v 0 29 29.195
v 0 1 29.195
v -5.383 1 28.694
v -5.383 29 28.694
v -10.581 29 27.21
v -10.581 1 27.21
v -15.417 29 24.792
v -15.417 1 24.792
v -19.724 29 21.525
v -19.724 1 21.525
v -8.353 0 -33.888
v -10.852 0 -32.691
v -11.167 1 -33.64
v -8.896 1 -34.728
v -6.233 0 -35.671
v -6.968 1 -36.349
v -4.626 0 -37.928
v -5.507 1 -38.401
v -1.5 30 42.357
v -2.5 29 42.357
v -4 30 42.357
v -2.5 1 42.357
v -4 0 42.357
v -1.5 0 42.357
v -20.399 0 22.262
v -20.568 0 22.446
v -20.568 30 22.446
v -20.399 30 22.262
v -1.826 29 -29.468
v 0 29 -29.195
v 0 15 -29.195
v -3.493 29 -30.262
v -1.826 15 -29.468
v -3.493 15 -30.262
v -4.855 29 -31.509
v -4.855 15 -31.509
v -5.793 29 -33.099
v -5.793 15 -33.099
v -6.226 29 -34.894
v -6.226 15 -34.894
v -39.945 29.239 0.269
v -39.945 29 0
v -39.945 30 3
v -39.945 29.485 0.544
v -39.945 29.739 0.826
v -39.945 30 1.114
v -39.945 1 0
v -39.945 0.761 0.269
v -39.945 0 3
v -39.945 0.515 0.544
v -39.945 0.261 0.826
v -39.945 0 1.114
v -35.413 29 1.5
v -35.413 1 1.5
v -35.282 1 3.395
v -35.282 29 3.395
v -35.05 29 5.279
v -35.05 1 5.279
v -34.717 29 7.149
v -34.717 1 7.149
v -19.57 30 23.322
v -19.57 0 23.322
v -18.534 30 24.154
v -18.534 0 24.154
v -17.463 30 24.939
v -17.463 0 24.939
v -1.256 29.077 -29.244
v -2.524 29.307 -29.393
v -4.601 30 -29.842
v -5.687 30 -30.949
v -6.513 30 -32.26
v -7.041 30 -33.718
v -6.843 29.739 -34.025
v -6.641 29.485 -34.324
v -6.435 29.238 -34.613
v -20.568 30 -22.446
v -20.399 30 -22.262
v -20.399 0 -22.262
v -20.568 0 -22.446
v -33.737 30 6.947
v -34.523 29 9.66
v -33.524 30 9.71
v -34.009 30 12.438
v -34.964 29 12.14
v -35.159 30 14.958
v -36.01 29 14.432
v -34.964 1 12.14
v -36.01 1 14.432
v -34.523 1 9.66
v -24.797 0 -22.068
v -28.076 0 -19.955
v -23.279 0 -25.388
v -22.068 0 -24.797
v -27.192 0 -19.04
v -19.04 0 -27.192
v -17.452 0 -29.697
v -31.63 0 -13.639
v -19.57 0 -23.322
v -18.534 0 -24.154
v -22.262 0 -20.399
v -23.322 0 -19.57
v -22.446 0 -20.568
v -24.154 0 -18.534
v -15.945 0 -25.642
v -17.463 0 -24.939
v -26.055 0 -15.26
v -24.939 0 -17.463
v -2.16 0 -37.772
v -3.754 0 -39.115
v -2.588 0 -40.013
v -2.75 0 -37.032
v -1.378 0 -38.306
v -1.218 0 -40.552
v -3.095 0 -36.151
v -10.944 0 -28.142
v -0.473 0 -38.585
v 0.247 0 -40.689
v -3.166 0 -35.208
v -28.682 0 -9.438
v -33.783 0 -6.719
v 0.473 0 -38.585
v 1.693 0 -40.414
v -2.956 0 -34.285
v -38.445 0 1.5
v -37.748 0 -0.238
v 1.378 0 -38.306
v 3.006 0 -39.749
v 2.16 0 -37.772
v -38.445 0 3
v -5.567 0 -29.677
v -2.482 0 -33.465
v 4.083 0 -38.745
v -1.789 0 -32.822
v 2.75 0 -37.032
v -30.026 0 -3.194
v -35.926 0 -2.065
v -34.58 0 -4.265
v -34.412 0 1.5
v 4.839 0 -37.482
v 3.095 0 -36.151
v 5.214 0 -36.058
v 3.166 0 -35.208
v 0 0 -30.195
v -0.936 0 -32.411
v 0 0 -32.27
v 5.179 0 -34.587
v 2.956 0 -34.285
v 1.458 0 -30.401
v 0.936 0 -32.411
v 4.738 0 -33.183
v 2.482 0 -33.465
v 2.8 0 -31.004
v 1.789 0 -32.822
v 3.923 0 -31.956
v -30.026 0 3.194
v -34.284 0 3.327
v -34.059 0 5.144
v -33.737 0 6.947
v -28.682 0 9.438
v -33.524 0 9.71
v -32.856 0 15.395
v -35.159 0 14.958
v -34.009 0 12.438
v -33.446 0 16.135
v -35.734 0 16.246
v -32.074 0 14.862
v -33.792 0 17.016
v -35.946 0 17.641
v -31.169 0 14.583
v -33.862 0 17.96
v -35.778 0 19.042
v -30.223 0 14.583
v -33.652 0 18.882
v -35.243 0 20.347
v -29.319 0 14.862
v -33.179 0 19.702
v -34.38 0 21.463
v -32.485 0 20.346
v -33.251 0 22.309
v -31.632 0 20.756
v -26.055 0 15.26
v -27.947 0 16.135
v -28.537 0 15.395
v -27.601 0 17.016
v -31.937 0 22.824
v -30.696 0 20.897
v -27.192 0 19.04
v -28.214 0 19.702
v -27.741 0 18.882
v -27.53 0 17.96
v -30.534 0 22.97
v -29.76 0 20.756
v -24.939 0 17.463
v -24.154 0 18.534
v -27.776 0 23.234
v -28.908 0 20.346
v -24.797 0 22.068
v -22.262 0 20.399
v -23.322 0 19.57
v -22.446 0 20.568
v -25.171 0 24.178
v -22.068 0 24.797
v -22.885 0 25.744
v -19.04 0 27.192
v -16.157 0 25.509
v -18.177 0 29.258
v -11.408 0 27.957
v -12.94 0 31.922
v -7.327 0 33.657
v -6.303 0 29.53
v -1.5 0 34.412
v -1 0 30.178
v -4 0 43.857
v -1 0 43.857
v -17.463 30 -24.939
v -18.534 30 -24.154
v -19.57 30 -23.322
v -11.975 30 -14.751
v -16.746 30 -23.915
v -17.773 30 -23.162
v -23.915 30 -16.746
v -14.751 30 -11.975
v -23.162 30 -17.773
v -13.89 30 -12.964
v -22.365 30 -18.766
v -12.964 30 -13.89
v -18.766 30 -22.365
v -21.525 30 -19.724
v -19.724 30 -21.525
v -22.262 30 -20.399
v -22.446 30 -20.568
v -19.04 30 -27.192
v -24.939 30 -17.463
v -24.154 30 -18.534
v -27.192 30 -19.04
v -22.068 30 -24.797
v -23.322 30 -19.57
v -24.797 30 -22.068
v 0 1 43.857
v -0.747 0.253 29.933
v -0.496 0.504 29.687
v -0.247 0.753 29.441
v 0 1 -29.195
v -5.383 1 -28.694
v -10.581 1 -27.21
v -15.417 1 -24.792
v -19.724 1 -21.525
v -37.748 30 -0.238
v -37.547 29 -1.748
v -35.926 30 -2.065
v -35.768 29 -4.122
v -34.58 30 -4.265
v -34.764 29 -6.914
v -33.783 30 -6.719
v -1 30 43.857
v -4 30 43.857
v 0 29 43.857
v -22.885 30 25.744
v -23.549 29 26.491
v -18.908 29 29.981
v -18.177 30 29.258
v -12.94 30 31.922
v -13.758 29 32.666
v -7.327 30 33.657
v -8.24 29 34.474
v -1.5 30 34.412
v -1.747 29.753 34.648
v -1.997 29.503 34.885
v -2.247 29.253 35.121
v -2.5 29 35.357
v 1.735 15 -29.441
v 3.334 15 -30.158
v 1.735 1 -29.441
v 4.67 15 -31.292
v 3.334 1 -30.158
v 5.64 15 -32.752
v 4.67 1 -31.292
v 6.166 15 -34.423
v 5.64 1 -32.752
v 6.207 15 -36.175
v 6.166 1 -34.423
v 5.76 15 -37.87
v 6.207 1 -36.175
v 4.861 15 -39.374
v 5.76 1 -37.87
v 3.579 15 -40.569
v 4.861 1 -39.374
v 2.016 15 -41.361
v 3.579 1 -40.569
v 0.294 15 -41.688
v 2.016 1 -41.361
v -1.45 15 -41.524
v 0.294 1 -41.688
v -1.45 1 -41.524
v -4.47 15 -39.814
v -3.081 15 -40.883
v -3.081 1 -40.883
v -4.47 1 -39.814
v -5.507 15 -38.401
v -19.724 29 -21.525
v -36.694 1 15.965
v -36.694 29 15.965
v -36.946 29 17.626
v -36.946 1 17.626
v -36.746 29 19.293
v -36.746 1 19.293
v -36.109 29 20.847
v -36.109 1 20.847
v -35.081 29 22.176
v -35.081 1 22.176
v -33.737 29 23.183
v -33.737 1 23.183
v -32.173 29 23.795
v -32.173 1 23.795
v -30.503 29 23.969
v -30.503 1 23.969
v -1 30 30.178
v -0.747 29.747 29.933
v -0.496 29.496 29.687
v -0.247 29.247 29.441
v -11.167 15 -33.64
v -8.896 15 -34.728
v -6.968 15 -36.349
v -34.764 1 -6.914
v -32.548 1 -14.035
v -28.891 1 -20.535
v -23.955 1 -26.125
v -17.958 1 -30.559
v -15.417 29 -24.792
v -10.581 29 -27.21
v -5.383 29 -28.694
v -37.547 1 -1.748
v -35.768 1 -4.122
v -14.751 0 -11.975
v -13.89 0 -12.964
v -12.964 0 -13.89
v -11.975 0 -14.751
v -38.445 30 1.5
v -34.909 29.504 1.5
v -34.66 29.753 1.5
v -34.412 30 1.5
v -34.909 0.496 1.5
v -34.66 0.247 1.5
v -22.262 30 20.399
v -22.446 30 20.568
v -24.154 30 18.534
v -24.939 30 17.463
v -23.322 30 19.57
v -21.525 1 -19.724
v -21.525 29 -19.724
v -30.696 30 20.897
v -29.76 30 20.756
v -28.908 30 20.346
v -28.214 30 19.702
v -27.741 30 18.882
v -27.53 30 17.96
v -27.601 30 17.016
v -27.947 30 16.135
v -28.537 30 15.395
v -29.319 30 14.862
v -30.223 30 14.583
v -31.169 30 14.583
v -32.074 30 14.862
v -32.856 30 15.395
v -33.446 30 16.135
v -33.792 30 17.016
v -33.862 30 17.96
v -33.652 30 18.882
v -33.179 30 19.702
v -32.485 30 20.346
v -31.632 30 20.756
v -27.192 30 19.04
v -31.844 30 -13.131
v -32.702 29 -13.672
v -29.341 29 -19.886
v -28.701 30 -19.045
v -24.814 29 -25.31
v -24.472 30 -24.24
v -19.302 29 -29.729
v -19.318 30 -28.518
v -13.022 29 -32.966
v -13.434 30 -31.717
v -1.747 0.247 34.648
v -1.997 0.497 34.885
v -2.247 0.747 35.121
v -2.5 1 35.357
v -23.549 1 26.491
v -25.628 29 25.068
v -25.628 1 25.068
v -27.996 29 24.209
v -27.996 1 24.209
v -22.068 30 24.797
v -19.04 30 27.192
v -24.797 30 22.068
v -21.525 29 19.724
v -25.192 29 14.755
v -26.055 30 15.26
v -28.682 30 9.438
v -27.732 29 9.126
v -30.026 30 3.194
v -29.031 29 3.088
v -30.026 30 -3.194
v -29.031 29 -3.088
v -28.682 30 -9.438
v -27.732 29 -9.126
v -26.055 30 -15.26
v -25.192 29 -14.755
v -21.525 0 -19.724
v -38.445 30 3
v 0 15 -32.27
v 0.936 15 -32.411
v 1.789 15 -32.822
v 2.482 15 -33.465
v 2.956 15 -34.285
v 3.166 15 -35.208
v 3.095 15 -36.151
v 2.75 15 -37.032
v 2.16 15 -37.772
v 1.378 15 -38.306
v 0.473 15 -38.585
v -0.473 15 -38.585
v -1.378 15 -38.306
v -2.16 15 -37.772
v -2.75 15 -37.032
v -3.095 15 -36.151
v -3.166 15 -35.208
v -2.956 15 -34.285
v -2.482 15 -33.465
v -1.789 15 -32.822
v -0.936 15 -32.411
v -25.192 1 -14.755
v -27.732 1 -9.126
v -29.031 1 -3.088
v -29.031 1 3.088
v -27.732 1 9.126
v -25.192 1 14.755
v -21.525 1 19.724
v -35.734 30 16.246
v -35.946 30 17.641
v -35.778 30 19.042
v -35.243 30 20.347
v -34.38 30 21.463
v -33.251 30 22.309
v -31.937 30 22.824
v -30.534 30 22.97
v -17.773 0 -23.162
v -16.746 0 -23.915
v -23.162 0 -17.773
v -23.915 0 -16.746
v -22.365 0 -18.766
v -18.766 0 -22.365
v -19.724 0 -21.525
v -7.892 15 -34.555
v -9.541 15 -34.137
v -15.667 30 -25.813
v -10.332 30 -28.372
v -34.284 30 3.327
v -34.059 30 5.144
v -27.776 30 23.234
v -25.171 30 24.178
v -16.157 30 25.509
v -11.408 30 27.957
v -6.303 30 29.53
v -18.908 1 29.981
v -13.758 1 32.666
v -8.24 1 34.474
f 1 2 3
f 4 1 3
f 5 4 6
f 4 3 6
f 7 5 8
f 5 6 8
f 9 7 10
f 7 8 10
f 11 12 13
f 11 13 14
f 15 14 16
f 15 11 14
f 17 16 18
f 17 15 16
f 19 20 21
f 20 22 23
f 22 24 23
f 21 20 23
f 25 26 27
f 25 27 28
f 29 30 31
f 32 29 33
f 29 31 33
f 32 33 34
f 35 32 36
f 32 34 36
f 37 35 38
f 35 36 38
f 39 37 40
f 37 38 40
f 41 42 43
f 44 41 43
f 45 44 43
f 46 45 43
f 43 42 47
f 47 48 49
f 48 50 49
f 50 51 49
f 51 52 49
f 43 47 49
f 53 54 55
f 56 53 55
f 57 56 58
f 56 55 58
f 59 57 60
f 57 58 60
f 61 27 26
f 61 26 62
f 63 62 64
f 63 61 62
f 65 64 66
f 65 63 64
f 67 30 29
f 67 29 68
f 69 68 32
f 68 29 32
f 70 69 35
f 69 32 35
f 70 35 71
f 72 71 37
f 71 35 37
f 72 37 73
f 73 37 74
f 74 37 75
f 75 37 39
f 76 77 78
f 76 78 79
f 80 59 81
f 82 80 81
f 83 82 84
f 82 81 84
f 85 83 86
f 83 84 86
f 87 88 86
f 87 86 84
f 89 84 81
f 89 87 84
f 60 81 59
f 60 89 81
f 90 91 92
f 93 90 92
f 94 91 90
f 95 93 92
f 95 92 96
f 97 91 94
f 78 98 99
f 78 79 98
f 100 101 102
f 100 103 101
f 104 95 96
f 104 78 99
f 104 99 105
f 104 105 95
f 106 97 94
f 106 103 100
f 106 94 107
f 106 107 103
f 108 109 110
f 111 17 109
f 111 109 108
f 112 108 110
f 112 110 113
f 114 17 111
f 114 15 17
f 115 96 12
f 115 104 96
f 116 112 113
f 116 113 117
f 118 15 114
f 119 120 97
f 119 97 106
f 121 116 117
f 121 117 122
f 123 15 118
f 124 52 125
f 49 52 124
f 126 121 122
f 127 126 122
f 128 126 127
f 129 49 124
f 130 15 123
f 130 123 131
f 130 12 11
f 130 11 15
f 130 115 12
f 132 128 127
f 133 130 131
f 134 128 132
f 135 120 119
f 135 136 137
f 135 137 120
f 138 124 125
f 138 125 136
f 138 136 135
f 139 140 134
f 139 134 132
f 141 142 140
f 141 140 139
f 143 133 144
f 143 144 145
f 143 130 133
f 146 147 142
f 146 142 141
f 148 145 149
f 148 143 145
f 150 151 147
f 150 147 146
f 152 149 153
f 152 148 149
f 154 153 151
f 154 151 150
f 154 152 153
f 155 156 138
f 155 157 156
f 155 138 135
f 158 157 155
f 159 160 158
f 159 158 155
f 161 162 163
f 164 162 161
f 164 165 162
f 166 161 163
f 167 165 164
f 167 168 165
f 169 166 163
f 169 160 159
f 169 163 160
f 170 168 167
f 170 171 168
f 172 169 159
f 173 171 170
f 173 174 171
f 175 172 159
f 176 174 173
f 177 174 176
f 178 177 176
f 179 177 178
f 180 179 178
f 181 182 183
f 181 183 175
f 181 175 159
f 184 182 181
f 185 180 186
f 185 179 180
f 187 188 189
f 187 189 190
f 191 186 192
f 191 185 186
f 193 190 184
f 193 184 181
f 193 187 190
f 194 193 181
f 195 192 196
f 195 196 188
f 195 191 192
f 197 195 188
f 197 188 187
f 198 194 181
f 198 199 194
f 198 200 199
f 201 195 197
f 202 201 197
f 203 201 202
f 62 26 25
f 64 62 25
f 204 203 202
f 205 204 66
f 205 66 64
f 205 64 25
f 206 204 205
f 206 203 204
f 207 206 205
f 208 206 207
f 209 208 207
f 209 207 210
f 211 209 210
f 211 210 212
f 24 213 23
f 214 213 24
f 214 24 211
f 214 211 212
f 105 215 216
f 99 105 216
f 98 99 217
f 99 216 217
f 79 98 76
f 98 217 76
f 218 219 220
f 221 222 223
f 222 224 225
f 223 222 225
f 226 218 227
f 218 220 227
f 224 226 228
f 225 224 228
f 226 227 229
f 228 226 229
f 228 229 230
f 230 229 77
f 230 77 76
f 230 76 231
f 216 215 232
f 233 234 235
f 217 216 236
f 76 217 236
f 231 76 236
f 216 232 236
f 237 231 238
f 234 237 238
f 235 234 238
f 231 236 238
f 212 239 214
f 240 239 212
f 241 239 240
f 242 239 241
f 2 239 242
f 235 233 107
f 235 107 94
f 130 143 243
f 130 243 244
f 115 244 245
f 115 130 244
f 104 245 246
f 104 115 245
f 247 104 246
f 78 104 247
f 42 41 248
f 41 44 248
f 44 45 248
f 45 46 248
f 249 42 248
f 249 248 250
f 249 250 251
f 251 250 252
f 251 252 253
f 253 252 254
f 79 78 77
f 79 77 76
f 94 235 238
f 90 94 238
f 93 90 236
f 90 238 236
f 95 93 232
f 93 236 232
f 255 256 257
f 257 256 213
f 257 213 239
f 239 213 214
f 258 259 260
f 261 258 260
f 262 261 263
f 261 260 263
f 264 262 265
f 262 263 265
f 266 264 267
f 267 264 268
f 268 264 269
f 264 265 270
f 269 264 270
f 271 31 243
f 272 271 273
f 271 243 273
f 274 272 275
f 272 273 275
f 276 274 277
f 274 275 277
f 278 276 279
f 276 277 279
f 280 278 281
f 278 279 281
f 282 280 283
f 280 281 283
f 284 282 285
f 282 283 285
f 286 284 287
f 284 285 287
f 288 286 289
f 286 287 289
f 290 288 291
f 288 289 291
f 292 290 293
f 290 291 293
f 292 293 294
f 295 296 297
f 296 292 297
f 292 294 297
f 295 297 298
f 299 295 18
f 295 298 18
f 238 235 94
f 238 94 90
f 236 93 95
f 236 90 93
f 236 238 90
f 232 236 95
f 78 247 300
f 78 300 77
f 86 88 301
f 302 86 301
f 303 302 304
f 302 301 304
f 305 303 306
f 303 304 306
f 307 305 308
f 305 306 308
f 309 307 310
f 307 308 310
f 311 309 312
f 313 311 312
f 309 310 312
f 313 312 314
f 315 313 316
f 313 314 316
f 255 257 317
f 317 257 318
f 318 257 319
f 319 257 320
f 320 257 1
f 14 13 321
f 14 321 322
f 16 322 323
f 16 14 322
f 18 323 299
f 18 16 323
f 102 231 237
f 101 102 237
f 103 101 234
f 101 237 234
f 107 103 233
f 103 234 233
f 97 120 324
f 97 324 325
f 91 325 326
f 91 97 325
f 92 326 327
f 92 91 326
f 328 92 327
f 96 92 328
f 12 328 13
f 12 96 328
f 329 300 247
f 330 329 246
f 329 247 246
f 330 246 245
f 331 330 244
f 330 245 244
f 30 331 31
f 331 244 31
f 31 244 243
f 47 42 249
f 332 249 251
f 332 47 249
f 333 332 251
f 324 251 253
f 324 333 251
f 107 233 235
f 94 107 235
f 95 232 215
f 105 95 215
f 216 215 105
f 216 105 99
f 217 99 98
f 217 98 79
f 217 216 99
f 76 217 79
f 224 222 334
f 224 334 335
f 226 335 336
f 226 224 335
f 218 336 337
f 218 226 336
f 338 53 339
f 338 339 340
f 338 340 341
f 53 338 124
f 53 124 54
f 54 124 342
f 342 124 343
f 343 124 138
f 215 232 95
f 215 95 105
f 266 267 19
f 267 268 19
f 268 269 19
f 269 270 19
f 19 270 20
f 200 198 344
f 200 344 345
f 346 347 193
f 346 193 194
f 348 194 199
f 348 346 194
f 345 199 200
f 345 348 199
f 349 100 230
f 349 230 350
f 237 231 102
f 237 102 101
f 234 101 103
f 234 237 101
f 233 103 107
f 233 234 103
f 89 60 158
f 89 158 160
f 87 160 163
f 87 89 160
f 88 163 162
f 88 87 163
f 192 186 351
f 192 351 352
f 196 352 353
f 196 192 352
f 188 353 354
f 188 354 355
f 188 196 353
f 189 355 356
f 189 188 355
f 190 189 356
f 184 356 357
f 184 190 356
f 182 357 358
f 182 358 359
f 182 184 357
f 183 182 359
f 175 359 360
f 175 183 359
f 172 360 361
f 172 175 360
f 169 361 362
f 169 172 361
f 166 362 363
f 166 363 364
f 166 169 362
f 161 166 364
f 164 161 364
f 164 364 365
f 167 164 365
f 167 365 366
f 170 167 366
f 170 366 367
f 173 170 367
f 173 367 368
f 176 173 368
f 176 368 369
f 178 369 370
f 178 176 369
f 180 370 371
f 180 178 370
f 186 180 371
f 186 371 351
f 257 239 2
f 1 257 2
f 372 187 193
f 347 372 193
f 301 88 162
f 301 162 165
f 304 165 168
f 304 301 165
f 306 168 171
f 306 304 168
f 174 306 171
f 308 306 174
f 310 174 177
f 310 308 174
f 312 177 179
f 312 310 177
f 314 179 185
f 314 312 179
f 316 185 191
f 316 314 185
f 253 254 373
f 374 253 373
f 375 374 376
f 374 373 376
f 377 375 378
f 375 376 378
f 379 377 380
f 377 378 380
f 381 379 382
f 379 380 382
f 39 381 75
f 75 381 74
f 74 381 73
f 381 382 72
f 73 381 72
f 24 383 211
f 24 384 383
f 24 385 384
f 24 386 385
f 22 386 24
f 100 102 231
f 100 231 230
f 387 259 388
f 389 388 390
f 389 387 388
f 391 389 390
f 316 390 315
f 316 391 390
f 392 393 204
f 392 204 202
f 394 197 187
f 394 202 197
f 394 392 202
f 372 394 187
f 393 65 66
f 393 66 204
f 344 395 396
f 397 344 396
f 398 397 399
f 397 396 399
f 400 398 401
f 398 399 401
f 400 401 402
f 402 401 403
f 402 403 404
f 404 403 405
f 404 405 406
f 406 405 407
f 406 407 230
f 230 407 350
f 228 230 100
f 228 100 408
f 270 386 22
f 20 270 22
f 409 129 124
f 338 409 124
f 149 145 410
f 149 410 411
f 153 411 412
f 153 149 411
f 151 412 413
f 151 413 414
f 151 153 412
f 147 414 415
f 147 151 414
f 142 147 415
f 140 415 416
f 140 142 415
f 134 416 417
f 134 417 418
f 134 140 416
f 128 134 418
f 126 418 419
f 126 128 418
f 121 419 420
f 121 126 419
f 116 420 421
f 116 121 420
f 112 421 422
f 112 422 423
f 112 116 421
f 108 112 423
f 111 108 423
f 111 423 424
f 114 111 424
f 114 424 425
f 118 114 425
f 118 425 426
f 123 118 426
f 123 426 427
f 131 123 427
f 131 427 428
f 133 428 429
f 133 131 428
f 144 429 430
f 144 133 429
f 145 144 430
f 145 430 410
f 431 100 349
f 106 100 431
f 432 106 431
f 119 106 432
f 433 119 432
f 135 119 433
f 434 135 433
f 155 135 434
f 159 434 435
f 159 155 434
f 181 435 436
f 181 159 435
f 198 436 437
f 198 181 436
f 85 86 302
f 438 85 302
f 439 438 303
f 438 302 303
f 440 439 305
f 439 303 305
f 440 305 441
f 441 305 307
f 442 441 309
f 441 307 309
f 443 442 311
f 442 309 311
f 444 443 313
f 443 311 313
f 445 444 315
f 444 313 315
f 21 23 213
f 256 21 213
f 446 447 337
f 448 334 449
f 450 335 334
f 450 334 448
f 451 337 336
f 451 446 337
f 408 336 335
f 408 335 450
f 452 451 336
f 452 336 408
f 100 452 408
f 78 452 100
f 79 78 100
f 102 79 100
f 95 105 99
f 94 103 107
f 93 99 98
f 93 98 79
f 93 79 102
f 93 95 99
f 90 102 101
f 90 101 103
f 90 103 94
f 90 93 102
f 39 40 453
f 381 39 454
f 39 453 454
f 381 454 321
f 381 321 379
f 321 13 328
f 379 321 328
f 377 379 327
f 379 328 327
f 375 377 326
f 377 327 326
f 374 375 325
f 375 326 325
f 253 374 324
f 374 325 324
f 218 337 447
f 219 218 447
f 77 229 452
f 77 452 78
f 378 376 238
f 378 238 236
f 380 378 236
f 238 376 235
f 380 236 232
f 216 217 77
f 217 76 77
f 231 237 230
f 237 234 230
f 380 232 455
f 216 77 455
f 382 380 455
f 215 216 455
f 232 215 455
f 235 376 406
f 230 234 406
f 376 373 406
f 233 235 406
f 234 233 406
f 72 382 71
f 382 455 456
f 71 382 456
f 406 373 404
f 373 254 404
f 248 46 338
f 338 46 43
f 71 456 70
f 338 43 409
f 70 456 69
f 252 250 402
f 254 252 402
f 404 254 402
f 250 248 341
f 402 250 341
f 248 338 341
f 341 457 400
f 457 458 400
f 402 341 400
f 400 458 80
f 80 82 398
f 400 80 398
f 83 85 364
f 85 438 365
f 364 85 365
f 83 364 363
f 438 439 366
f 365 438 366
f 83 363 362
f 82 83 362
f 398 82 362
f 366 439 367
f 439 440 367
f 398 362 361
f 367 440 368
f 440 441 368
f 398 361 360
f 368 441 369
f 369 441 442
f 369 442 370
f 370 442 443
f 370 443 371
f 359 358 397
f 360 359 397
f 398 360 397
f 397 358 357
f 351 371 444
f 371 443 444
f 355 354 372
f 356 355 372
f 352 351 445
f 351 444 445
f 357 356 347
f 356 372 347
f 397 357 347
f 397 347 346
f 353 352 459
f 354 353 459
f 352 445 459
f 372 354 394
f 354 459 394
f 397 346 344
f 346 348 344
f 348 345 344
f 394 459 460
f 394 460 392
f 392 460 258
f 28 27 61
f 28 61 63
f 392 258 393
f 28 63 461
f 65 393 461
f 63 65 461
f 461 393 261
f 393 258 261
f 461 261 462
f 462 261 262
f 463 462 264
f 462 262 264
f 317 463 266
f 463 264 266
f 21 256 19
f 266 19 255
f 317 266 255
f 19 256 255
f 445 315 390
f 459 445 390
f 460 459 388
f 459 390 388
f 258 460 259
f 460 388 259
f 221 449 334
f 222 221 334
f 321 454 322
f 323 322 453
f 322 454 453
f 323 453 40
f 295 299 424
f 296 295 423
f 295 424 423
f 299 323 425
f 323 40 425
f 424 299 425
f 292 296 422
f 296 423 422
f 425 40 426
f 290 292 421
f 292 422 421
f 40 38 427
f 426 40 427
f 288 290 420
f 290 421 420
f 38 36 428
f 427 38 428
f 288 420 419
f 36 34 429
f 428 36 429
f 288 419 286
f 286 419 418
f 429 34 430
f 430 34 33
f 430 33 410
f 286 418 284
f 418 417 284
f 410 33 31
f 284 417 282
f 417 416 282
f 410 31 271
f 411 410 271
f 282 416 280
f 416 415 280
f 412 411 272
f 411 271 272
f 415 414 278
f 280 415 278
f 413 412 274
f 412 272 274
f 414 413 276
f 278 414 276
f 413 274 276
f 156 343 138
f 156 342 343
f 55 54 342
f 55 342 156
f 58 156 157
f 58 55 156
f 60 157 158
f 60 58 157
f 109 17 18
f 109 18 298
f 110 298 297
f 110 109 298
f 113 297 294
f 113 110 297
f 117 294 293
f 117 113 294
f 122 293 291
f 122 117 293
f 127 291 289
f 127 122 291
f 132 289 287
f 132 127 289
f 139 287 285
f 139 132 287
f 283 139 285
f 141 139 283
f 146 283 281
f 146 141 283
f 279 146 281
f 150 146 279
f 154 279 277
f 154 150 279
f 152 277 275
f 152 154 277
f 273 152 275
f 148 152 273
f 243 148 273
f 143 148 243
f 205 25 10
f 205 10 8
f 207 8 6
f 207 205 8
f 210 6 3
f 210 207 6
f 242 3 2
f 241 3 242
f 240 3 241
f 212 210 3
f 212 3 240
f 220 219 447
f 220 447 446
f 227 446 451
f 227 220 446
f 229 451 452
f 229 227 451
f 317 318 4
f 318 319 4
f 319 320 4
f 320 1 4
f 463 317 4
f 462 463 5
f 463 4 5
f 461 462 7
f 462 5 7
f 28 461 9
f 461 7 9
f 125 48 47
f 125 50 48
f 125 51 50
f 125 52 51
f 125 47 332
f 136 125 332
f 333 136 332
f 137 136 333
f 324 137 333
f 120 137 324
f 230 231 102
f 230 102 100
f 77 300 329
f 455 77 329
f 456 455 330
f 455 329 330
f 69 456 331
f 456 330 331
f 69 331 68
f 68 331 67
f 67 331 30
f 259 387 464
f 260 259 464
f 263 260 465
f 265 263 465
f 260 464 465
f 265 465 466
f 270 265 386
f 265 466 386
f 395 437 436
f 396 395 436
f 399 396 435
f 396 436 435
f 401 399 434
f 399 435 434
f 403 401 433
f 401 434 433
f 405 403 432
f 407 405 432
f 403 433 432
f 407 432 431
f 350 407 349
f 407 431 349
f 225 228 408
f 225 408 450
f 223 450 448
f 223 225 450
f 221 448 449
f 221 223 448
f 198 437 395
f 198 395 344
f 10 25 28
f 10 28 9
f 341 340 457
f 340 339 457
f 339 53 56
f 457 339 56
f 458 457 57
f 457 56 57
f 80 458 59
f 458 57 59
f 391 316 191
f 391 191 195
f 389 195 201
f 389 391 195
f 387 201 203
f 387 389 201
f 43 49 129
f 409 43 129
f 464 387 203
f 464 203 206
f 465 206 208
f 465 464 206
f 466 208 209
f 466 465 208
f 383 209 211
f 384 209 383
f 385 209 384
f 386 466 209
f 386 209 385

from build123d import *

# Parameters (mm, degrees)
SKETCH3_R           = 3.175
BOSS_EXTRUDE2_DEPTH = 30
SKETCH3_6_R         = 6.25
SKETCH3_6_R_2       = 3.175
BOSS_EXTRUDE3_DEPTH = 15
FILLET1_R           = 10
CHAMFER1_SIZE       = 1
JAW_SLOT_DEPTH      = 67.475644682
TPU_JAW_DEPTH       = 30
SLOT_PATTERN_COUNT  = 2
SLOT_PATTERN_ANGLE  = 90


with BuildPart() as part:
    # Sketch3 → Boss-Extrude2 (new body)
    with BuildSketch(Plane(origin=(0, 0, 0), x_dir=(1, 0, 0), z_dir=(0, 1, 0))):
        with BuildLine():
            ThreePointArc((0, 29.1949759), (-4.220104361, 30.834854515), (-6.225661875, 34.893945761))
            ThreePointArc((-6.225661875, 34.893945761), (-27.175492191, 22.756074809), (-35.4449759, 0))
            Line((-35.4449759, 0), (-39.9449759, 0))
            Line((-39.9449759, 0), (-39.9449759, -3))
            Line((-39.9449759, -3), (-38.4449759, -3))
            Line((-38.4449759, -3), (-38.4449759, -1.5))
            Line((-38.4449759, -1.5), (-35.413222341, -1.5))
            ThreePointArc((-35.413222341, -1.5), (-34.775367062, -6.857124927), (-33.331874405, -12.055391541))
            ThreePointArc((-33.331874405, -12.055391541), (-36.10890834, -20.84748795), (-27.10621253, -22.83855422))
            ThreePointArc((-27.10621253, -22.83855422), (-16.071961789, -31.591745137), (-2.5, -35.356701155))
            Line((-2.5, -35.356701155), (-2.5, -42.356701155))
            Line((-2.5, -42.356701155), (-4, -42.356701155))
            Line((-4, -42.356701155), (-4, -43.856701155))
            Line((-4, -43.856701155), (0, -43.856701155))
            Line((0, -43.856701155), (0, -29.1949759))
            ThreePointArc((0, -29.1949759), (-29.1949759, 0), (0, 29.1949759))
        make_face()
        with Locations(Location((-30.696249566, -17.72248795, 0), (0, 0, 270))):
            Circle(SKETCH3_R, mode=Mode.SUBTRACT)
    extrude(amount=BOSS_EXTRUDE2_DEPTH)

    # Sketch3<6> → Boss-Extrude3 (add)
    with BuildSketch(Plane(origin=(0, 0, 0), x_dir=(1, 0, 0), z_dir=(0, 1, 0))):
        with Locations((0, 35.4449759)):
            Circle(SKETCH3_6_R)
        with Locations(Location((0, 35.4449759, 0), (0, 0, 270))):
            Circle(SKETCH3_6_R_2, mode=Mode.SUBTRACT)
    extrude(amount=BOSS_EXTRUDE3_DEPTH)

    # Fillet1
    # the kernel refuses this fillet: 10 mm, written as the material it adds along each edge
    with BuildSketch(Plane(origin=(-27.10621253, 0, 22.83855422), x_dir=(0.6976659907384, 0, 0.7164231747835959), z_dir=(0, 1, 0))) as fillet1_piece_1:
        with BuildLine():
            CenterArc((5.817172713, -9.974107894), FILLET1_R, 94.123965917, 43.409086789)
            ThreePointArc((-1.559496763, -3.222460137), (-0.544085424, -1.725278219), (0, 0))
            ThreePointArc((0, 0), (2.549013098, -0.091774506), (5.098026196, 0))
        make_face()
    extrude(amount=30)
    with BuildSketch(Plane(origin=(-33.331874405, 0, 12.055391541), x_dir=(-0.27160767385328266, 0, -0.9624080587276942), z_dir=(0, 1, 0))) as fillet1_piece_2:
        with BuildLine():
            CenterArc((5.817172713, 9.974107894), FILLET1_R, 222.466947294, 43.409086789)
            ThreePointArc((-1.559496763, 3.222460137), (-0.544085424, 1.725278219), (0, 0))
            ThreePointArc((0, 0), (2.549013098, 0.091774506), (5.098026196, 0))
        make_face()
    extrude(amount=30)
    with BuildSketch(Plane(origin=(-6.225661875, 0, -34.893945761), x_dir=(-0.9692736645916937, 0, 0.24598488394409268), z_dir=(0, 1, 0))) as fillet1_piece_3:
        with BuildLine():
            CenterArc((5.817172713, -9.974107894), FILLET1_R, 94.123965917, 43.409086789)
            ThreePointArc((-1.559496763, -3.222460137), (-0.544085424, -1.725278219), (0, 0))
            ThreePointArc((0, 0), (2.549013098, -0.091774506), (5.098026196, 0))
        make_face()
    extrude(amount=15)
    with BuildSketch(Plane(origin=(-35.4449759, 0, 0), x_dir=(-1, 0, 0), z_dir=(0, 1, 0))) as fillet1_piece_4:
        with BuildLine():
            CenterArc((9.126923994, -8.865188907), FILLET1_R, 117.560980045, 51.189901885)
            ThreePointArc((-0.680958838, -6.914436655), (-0.17065051, -3.473943695), (0, 0))
            Line((0, 0), (4.5, 0))
        make_face()
    extrude(amount=30)

    # Chamfer1
    chamfer1_edges = [part.edges().sort_by_distance(p)[0] for p in [
        (-36.569195939, 0, -2.868795874),
        (-36.569195939, 30, -2.868795874),
        (-26.570252382, 0, -23.459923378),
        (-24.814344184, 30, -25.309971143),
        (-7.880536789, 0, -35.477901284),
        (5.363659035, 0, -38.653349594),
        (-29.1949759, 0, 0),
        (0, 0, 36.525838527),
        (-2.5, 0, 38.856701155),
        (-13.758438746, 0, 32.665756991),
        (-26.784495391, 0, 24.563695697),
        (-36.10890834, 0, 20.84748795),
        (-34.665032179, 0, 10.914205587),
        (-35.178454065, 0, 4.338511975),
        (-4.220104361, 30, -30.834854515),
        (-29.1949759, 30, 0),
        (0, 30, 36.525838527),
        (-2.5, 30, 38.856701155),
        (-13.758438746, 30, 32.665756991),
        (-26.784495391, 30, 24.563695697),
        (-36.10890834, 30, 20.84748795),
        (-34.665032179, 30, 10.914205587),
        (-35.178454065, 30, 4.338511975),
    ]]
    chamfer(chamfer1_edges, length=CHAMFER1_SIZE)

    # Sketch4 → jaw_slot (cut, symmetric)
    with BuildSketch(Plane(origin=(0, 30, 0), x_dir=(1, 0, 0), z_dir=(0, 1, 0))):
        with BuildLine():
            ThreePointArc((-17.462520782, 24.939064247), (-21.527848912, 21.527848912), (-24.939064247, 17.462520782))
            Line((-24.939064247, 17.462520782), (-27.191732369, 19.039855981))
            ThreePointArc((-27.191732369, 19.039855981), (-23.47239256, 23.47239256), (-19.039855981, 27.191732369))
            Line((-19.039855981, 27.191732369), (-17.462520782, 24.939064247))
        make_face()
        with BuildLine():
            ThreePointArc((-20.399430037, 22.262071417), (-21.351072217, 21.351072217), (-22.262071417, 20.399430037))
            Line((-22.262071417, 20.399430037), (-21.52479408, 19.72383983))
            ThreePointArc((-21.52479408, 19.72383983), (-22.768708689, 18.273820686), (-23.915124191, 16.745550236))
            Line((-23.915124191, 16.745550236), (-14.751170485, 11.975097884))
            ThreePointArc((-14.751170485, 11.975097884), (-13.435028843, 13.435028843), (-11.975097884, 14.751170485))
            Line((-11.975097884, 14.751170485), (-16.745550236, 23.915124191))
            ThreePointArc((-16.745550236, 23.915124191), (-18.273820686, 22.768708689), (-19.72383983, 21.52479408))
            Line((-19.72383983, 21.52479408), (-20.399430037, 22.262071417))
        make_face()
        with BuildLine():
            ThreePointArc((-20.568327589, 22.446390751), (-21.527848912, 21.527848912), (-22.446390751, 20.568327589))
            Line((-22.446390751, 20.568327589), (-22.262071417, 20.399430037))
            ThreePointArc((-22.262071417, 20.399430037), (-21.351072217, 21.351072217), (-20.399430037, 22.262071417))
            Line((-20.399430037, 22.262071417), (-20.568327589, 22.446390751))
        make_face()
    jaw_slot = extrude(amount=JAW_SLOT_DEPTH, both=True, mode=Mode.SUBTRACT)

    # slot_pattern: jaw_slot ×2 about axis
    slot_pattern_axis = Axis((0, -1.524877817, 0), (0, 1, 0))
    for i in range(1, SLOT_PATTERN_COUNT):
        add(jaw_slot.rotate(slot_pattern_axis, i * SLOT_PATTERN_ANGLE / (SLOT_PATTERN_COUNT - 1)), mode=Mode.SUBTRACT)


with BuildPart() as body_2:
    # Sketch4<3> → tpu_jaw (new body)
    with BuildSketch(Plane(origin=(0, 30, 0), x_dir=(1, 0, 0), z_dir=(0, 1, 0))):
        with BuildLine():
            ThreePointArc((-17.462520782, 24.939064247), (-21.527848912, 21.527848912), (-24.939064247, 17.462520782))
            Line((-24.939064247, 17.462520782), (-27.191732369, 19.039855981))
            ThreePointArc((-27.191732369, 19.039855981), (-23.47239256, 23.47239256), (-19.039855981, 27.191732369))
            Line((-19.039855981, 27.191732369), (-17.462520782, 24.939064247))
        make_face()
        with BuildLine():
            ThreePointArc((-20.399430037, 22.262071417), (-21.351072217, 21.351072217), (-22.262071417, 20.399430037))
            Line((-22.262071417, 20.399430037), (-21.52479408, 19.72383983))
            ThreePointArc((-21.52479408, 19.72383983), (-22.768708689, 18.273820686), (-23.915124191, 16.745550236))
            Line((-23.915124191, 16.745550236), (-14.751170485, 11.975097884))
            ThreePointArc((-14.751170485, 11.975097884), (-13.435028843, 13.435028843), (-11.975097884, 14.751170485))
            Line((-11.975097884, 14.751170485), (-16.745550236, 23.915124191))
            ThreePointArc((-16.745550236, 23.915124191), (-18.273820686, 22.768708689), (-19.72383983, 21.52479408))
            Line((-19.72383983, 21.52479408), (-20.399430037, 22.262071417))
        make_face()
        with BuildLine():
            ThreePointArc((-20.568327589, 22.446390751), (-21.527848912, 21.527848912), (-22.446390751, 20.568327589))
            Line((-22.446390751, 20.568327589), (-22.262071417, 20.399430037))
            ThreePointArc((-22.262071417, 20.399430037), (-21.351072217, 21.351072217), (-20.399430037, 22.262071417))
            Line((-20.399430037, 22.262071417), (-20.568327589, 22.446390751))
        make_face()
    extrude(amount=-TPU_JAW_DEPTH)


solid = Compound([part.part, body_2.part])
